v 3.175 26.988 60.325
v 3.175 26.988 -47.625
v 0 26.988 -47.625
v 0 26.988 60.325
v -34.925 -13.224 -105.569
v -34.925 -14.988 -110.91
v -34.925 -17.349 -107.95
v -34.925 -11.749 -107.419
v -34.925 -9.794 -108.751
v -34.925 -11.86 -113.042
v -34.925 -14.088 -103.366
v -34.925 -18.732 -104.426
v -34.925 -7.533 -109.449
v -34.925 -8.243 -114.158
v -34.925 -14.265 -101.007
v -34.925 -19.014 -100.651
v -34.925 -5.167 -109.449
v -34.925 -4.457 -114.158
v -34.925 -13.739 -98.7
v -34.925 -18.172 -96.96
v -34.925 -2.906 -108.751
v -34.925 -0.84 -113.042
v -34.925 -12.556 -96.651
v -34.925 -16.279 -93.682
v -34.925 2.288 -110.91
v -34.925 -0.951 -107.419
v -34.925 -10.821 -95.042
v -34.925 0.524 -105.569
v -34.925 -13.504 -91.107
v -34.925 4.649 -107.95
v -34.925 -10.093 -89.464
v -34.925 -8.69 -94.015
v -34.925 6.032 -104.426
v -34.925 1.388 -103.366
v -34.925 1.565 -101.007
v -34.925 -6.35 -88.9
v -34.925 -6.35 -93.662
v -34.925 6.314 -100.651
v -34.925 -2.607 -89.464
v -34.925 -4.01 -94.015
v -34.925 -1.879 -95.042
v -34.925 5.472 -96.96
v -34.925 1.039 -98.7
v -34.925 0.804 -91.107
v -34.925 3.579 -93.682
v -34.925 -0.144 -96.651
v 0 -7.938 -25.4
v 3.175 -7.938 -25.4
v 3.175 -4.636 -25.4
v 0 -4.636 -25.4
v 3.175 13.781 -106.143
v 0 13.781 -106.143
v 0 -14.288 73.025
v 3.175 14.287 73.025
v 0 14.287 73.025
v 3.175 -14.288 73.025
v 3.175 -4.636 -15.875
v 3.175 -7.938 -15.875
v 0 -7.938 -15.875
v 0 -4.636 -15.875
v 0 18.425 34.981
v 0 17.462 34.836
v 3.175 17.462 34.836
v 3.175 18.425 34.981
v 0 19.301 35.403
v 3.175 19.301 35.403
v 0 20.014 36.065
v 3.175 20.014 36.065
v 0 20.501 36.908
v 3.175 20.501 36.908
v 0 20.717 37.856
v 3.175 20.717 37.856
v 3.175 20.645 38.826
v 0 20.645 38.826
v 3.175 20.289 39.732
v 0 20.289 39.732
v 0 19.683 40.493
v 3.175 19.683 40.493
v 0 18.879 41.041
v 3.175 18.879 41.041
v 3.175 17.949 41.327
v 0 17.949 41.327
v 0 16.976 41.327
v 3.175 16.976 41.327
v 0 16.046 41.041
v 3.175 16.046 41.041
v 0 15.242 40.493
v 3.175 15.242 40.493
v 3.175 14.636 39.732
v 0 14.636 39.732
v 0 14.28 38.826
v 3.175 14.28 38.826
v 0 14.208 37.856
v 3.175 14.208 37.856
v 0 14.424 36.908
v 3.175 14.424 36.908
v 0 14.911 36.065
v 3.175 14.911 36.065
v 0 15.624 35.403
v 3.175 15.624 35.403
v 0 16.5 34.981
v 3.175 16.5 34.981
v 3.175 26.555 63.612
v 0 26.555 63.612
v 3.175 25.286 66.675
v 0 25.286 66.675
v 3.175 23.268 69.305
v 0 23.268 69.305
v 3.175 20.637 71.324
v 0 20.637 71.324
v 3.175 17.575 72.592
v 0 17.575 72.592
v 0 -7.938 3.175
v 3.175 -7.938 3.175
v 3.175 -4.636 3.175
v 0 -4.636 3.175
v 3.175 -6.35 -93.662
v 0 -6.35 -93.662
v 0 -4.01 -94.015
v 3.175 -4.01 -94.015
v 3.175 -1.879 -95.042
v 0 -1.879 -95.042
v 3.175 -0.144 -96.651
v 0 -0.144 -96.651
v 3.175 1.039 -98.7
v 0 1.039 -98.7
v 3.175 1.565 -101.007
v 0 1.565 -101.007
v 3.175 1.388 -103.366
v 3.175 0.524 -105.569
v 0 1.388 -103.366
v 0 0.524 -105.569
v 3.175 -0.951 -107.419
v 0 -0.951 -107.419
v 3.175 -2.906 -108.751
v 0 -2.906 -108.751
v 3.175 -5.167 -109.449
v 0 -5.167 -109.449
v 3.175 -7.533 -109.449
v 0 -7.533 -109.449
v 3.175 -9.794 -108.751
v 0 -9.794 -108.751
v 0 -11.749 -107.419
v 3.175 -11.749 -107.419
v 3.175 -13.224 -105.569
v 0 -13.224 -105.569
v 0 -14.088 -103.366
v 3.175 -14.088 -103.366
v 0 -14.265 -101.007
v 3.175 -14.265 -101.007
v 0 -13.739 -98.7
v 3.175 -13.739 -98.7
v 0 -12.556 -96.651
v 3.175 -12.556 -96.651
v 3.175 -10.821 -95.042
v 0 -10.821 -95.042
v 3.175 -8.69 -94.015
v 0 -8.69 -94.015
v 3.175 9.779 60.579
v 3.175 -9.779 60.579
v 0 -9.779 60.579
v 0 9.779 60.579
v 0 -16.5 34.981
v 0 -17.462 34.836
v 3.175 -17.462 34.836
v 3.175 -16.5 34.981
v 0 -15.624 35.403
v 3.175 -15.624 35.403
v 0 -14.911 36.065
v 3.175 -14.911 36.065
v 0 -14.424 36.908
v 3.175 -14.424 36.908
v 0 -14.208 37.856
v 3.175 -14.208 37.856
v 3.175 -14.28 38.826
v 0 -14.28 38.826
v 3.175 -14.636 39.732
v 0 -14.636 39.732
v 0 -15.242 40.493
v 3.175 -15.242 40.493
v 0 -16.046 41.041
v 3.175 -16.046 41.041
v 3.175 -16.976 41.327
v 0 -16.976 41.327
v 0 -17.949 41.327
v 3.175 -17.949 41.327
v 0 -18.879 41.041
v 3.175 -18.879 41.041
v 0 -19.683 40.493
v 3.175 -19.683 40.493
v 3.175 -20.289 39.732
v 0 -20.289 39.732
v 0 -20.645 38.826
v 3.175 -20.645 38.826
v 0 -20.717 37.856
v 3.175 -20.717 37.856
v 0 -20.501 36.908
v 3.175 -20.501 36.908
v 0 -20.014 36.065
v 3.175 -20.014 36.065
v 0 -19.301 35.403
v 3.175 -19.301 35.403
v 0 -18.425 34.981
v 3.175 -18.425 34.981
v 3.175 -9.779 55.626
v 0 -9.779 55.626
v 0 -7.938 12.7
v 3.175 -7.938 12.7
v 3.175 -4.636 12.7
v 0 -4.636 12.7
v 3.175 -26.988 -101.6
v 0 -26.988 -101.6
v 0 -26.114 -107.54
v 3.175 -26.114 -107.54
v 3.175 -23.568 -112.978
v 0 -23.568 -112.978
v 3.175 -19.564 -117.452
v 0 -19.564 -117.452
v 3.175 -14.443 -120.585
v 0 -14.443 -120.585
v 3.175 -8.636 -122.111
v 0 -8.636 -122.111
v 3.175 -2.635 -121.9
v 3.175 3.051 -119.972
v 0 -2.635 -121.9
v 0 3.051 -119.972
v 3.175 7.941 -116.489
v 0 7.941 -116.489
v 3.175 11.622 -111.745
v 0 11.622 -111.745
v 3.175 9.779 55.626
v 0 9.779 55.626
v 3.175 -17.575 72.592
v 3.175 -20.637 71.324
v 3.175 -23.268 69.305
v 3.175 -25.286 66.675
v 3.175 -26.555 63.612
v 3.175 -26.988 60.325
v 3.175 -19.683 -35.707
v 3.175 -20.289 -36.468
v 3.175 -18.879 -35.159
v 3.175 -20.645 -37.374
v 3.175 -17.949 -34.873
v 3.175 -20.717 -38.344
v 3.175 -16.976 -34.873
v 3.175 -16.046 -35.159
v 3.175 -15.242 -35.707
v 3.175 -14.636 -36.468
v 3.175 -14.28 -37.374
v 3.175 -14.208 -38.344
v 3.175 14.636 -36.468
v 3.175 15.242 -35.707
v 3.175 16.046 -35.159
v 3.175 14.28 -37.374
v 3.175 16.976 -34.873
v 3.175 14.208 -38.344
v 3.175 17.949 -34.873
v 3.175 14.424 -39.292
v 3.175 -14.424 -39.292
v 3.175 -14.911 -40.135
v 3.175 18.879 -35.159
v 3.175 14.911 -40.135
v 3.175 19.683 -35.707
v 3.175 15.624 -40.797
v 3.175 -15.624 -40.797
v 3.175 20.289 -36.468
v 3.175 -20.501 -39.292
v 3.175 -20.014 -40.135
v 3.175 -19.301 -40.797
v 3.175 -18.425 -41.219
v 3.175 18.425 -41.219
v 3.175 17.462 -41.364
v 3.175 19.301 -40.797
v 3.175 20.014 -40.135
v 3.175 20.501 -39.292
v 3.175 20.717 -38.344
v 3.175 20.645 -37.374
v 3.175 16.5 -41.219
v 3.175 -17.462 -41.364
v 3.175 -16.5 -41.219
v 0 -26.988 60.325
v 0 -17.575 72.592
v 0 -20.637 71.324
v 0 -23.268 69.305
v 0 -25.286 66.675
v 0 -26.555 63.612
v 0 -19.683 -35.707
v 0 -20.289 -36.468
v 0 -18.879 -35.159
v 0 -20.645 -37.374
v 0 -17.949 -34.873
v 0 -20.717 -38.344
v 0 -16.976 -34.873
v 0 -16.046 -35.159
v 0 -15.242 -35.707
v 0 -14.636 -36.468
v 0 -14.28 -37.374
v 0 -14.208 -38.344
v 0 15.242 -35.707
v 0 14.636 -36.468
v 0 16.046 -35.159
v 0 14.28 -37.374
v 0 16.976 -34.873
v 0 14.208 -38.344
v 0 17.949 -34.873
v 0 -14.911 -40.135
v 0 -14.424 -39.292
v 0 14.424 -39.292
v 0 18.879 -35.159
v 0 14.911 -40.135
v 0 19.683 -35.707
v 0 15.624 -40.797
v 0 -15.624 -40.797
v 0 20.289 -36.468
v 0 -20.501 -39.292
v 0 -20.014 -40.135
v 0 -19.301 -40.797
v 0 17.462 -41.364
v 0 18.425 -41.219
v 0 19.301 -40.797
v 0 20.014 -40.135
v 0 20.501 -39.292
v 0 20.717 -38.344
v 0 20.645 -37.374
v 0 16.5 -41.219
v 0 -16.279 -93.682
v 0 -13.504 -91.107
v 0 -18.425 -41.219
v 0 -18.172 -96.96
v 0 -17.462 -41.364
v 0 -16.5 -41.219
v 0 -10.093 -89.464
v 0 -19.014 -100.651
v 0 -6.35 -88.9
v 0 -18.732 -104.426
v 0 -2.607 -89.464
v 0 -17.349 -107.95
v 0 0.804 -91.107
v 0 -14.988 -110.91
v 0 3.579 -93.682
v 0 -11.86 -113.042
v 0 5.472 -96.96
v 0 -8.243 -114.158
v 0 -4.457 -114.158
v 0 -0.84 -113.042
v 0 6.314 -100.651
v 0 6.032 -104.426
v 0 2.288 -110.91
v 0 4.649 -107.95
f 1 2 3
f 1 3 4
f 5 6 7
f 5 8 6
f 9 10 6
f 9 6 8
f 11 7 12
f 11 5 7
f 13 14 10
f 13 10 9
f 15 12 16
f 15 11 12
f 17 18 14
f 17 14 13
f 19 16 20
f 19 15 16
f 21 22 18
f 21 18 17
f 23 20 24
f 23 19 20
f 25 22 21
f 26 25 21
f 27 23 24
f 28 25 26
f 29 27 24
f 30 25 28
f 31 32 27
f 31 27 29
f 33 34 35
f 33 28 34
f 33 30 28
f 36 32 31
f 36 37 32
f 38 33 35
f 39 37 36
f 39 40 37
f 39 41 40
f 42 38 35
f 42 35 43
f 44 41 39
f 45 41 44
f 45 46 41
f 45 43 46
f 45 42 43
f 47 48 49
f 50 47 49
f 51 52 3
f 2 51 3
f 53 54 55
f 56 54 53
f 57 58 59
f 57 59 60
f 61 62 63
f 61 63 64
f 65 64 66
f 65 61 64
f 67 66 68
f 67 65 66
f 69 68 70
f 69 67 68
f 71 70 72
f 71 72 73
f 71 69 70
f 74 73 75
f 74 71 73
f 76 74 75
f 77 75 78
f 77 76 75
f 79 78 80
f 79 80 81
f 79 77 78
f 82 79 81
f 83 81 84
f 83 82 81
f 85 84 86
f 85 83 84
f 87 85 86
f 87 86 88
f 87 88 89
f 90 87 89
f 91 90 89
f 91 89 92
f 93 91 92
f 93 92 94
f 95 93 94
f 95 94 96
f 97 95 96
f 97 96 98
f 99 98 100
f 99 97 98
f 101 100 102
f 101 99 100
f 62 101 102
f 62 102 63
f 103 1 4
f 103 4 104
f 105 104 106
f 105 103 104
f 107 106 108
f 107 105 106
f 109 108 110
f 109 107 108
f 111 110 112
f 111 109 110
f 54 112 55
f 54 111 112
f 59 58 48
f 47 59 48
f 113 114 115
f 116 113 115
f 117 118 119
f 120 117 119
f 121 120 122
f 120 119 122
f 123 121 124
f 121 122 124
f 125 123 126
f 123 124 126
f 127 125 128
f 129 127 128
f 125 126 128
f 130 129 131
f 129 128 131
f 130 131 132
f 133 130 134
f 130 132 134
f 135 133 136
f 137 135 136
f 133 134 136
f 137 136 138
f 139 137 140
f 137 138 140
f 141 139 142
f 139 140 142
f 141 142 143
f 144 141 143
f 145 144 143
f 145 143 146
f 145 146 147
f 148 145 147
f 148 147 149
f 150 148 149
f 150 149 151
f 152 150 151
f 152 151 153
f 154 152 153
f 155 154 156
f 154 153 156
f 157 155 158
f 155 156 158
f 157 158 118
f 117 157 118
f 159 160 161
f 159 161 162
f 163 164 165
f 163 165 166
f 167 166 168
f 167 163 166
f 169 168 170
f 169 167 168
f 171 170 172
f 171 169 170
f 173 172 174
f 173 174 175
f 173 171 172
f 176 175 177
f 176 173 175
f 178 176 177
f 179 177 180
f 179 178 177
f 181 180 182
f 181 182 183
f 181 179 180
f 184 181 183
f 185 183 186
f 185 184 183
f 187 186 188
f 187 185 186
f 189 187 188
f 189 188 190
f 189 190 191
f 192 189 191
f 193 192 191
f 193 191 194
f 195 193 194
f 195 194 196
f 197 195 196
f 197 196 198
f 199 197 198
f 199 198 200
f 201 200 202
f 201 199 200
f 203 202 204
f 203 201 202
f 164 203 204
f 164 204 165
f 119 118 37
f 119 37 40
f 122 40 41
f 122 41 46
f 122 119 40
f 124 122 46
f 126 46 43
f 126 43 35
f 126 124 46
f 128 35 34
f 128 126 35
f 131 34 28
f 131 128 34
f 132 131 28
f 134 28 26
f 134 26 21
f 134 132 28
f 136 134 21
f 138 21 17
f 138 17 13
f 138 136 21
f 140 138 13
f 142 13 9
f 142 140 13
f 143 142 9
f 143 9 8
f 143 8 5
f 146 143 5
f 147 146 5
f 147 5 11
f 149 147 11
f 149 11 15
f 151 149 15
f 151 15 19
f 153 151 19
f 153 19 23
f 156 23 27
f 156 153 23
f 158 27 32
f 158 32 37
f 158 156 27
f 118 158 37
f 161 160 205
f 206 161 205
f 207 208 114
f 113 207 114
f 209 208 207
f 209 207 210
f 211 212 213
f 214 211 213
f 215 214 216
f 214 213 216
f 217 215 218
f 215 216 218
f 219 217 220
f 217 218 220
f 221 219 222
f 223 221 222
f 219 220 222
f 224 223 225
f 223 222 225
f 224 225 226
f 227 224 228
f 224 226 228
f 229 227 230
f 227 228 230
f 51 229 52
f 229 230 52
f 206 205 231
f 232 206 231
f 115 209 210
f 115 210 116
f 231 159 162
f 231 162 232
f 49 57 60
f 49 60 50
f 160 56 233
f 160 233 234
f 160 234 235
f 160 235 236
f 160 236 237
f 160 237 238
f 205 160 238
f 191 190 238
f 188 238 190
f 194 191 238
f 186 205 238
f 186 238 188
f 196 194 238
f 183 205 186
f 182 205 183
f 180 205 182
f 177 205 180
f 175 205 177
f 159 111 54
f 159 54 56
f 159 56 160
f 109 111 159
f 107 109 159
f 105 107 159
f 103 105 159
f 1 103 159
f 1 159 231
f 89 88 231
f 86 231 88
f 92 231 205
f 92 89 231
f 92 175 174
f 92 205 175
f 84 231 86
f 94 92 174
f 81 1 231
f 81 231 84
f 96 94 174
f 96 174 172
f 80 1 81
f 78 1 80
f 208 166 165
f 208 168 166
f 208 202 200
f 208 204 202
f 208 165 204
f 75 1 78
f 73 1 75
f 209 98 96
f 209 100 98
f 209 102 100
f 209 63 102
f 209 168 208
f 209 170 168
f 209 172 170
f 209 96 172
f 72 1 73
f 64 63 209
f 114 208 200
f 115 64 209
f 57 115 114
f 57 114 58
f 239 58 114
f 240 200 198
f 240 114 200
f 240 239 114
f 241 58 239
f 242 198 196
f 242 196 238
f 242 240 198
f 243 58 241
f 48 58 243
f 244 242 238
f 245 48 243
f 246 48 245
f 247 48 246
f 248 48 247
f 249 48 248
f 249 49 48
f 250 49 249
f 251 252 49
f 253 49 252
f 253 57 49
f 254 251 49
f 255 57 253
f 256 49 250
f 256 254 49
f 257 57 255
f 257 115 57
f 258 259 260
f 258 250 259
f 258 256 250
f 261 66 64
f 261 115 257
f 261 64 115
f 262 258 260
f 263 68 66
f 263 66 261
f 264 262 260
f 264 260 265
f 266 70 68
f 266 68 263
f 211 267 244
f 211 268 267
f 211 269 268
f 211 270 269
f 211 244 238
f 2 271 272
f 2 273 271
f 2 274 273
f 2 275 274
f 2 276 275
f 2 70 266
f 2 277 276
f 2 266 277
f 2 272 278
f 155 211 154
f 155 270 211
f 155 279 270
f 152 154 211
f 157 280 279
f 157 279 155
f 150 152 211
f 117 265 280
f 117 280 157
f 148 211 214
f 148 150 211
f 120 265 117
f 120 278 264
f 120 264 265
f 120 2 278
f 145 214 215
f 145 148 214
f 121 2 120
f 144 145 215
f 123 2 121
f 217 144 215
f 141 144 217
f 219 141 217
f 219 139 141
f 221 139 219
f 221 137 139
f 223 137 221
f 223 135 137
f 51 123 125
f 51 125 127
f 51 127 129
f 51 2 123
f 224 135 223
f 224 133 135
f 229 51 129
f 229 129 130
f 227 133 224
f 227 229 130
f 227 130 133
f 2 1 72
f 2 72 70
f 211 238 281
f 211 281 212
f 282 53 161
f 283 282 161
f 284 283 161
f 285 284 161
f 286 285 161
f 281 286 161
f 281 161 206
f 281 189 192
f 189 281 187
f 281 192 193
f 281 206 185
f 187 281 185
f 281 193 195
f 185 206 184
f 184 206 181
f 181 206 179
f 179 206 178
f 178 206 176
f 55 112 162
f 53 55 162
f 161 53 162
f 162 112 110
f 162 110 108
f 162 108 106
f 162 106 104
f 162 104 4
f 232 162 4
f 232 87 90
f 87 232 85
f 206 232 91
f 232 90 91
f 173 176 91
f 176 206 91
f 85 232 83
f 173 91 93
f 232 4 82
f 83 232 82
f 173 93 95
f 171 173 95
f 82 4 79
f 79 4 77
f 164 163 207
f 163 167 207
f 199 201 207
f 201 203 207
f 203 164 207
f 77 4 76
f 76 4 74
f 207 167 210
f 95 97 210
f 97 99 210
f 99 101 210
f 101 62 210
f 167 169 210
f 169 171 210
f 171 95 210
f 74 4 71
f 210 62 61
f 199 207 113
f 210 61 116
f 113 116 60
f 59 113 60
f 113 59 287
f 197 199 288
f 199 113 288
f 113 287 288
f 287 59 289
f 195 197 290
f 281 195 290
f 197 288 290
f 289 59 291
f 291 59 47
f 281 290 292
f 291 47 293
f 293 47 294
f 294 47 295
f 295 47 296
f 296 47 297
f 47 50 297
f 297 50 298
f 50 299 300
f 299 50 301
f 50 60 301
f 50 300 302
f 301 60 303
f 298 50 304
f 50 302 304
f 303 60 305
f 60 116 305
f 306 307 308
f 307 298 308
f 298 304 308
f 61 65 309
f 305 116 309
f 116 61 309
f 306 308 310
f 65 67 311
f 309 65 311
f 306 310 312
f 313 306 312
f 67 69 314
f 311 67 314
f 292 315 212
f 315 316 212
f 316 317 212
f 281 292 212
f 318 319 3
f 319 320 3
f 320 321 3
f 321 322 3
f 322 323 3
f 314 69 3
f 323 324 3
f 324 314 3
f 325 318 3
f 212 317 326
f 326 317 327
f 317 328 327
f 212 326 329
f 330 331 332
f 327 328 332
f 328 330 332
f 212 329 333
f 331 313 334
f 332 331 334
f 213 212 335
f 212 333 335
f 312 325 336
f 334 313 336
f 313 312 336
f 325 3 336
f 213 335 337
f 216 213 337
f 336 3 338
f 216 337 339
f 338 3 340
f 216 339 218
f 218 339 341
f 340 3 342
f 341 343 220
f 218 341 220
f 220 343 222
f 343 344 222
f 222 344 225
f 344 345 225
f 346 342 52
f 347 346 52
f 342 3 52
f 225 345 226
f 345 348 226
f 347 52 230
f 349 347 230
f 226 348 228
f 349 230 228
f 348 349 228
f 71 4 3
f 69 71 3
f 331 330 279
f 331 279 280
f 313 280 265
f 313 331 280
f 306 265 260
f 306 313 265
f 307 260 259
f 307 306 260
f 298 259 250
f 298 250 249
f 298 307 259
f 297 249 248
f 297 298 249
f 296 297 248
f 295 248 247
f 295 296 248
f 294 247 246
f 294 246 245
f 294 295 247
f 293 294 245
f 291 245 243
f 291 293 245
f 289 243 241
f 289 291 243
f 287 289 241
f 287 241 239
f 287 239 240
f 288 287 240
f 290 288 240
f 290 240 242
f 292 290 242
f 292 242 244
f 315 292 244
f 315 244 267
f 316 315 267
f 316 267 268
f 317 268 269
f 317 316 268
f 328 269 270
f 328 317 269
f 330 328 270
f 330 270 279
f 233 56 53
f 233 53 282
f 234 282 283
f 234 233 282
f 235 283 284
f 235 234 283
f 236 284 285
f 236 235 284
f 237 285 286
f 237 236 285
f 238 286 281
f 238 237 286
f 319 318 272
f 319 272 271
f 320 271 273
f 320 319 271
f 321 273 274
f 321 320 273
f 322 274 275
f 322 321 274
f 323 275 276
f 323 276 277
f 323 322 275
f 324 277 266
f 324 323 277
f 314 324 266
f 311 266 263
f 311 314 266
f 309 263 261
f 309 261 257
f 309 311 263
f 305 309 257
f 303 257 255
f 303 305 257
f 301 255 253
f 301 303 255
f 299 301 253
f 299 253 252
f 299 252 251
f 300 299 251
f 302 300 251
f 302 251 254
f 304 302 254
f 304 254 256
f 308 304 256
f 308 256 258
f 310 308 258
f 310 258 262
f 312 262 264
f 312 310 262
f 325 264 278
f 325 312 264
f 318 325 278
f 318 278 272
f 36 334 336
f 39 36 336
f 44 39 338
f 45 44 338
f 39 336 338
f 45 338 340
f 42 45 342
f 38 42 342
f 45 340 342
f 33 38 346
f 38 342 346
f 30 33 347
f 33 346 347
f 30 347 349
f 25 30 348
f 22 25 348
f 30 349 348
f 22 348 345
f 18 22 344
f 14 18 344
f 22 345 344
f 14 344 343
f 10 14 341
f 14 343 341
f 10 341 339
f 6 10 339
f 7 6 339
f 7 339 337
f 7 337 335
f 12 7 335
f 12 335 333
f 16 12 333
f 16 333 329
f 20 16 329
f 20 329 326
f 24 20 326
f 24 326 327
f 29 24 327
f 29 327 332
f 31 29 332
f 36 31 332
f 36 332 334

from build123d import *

# Parameters (mm, degrees)
SKETCH1_R                = 3.2639
SKETCH1_R_2              = 12.7
BOSS_EXTRUDE1_DEPTH      = 3.175
SKETCH2_R                = 12.7
SKETCH2_R_2              = 7.9375
BOSS_EXTRUDE2_DEPTH      = 34.925
BOSS_EXTRUDE2_DEPTH_BACK = 3.175
SKETCH4_W                = 4.953
SKETCH4_H                = 19.558
BOSS_EXTRUDE3_DEPTH      = 3.175
SKETCH5_W                = 9.525
SKETCH5_H                = 3.302
CUT_EXTRUDE1_DEPTH       = 39.1


with BuildPart() as part:
    # Sketch1 → Boss-Extrude1 (new body)
    with BuildSketch(Plane(origin=(0, 0, 0), x_dir=(0, 0, -1), z_dir=(1, 0, 0))):
        with BuildLine():
            Line((106.143178695, 13.781217887), (47.625, 26.9875))
            Line((47.625, 26.9875), (-47.625, 26.9875))
            Line((-47.625, 26.9875), (-47.625, -26.9875))
            Line((-47.625, -26.9875), (101.6, -26.9875))
            ThreePointArc((101.6, -26.9875), (122.110538942, -8.635650576), (106.143178695, 13.781217887))
        make_face()
        with Locations((38.1, 17.4625)):
            Circle(SKETCH1_R, mode=Mode.SUBTRACT)
        with Locations((38.1, -17.4625)):
            Circle(SKETCH1_R, mode=Mode.SUBTRACT)
        with Locations((-38.1, -17.4625)):
            Circle(SKETCH1_R, mode=Mode.SUBTRACT)
        with Locations((-38.1, 17.4625)):
            Circle(SKETCH1_R, mode=Mode.SUBTRACT)
        with Locations((101.6, -6.35)):
            Circle(SKETCH1_R_2, mode=Mode.SUBTRACT)
    extrude(amount=BOSS_EXTRUDE1_DEPTH)

    # Sketch2 → Boss-Extrude2 (add, two sides)
    with BuildSketch(Plane.ZY) as boss_extrude2_sk:
        with Locations((-101.6, -6.35)):
            Circle(SKETCH2_R)
        with Locations((-101.6, -6.35)):
            Circle(SKETCH2_R_2, mode=Mode.SUBTRACT)
    extrude(amount=BOSS_EXTRUDE2_DEPTH)
    extrude(boss_extrude2_sk.sketch, amount=-BOSS_EXTRUDE2_DEPTH_BACK)

    # Sketch4 → Boss-Extrude3 (add)
    with BuildSketch(Plane(origin=(3.175, 0, 0), x_dir=(0, 0, -1), z_dir=(1, 0, 0))):
        with BuildLine():
            Line((-47.625, 26.9875), (-60.325, 26.9875))
            ThreePointArc((-60.325, 26.9875), (-69.305256121, 23.267756121), (-73.025, 14.2875))
            Line((-73.025, 14.2875), (-73.025, -14.2875))
            ThreePointArc((-73.025, -14.2875), (-69.305256121, -23.267756121), (-60.325, -26.9875))
            Line((-60.325, -26.9875), (-47.625, -26.9875))
            Line((-47.625, -26.9875), (-47.625, 26.9875))
        make_face()
        with Locations((-58.1025, 0)):
            Rectangle(SKETCH4_W, SKETCH4_H, mode=Mode.SUBTRACT)
    extrude(amount=-BOSS_EXTRUDE3_DEPTH)

    # Sketch5 → Cut-Extrude1 (cut, through all)
    with BuildSketch(Plane(origin=(3.175, 0, 0), x_dir=(0, 0, -1), z_dir=(1, 0, 0))):
        with Locations((20.6375, -6.2865)):
            Rectangle(SKETCH5_W, SKETCH5_H)
        with Locations((-7.9375, -6.2865)):
            Rectangle(SKETCH5_W, SKETCH5_H)
    extrude(amount=-CUT_EXTRUDE1_DEPTH, mode=Mode.SUBTRACT)


solid = part.part
